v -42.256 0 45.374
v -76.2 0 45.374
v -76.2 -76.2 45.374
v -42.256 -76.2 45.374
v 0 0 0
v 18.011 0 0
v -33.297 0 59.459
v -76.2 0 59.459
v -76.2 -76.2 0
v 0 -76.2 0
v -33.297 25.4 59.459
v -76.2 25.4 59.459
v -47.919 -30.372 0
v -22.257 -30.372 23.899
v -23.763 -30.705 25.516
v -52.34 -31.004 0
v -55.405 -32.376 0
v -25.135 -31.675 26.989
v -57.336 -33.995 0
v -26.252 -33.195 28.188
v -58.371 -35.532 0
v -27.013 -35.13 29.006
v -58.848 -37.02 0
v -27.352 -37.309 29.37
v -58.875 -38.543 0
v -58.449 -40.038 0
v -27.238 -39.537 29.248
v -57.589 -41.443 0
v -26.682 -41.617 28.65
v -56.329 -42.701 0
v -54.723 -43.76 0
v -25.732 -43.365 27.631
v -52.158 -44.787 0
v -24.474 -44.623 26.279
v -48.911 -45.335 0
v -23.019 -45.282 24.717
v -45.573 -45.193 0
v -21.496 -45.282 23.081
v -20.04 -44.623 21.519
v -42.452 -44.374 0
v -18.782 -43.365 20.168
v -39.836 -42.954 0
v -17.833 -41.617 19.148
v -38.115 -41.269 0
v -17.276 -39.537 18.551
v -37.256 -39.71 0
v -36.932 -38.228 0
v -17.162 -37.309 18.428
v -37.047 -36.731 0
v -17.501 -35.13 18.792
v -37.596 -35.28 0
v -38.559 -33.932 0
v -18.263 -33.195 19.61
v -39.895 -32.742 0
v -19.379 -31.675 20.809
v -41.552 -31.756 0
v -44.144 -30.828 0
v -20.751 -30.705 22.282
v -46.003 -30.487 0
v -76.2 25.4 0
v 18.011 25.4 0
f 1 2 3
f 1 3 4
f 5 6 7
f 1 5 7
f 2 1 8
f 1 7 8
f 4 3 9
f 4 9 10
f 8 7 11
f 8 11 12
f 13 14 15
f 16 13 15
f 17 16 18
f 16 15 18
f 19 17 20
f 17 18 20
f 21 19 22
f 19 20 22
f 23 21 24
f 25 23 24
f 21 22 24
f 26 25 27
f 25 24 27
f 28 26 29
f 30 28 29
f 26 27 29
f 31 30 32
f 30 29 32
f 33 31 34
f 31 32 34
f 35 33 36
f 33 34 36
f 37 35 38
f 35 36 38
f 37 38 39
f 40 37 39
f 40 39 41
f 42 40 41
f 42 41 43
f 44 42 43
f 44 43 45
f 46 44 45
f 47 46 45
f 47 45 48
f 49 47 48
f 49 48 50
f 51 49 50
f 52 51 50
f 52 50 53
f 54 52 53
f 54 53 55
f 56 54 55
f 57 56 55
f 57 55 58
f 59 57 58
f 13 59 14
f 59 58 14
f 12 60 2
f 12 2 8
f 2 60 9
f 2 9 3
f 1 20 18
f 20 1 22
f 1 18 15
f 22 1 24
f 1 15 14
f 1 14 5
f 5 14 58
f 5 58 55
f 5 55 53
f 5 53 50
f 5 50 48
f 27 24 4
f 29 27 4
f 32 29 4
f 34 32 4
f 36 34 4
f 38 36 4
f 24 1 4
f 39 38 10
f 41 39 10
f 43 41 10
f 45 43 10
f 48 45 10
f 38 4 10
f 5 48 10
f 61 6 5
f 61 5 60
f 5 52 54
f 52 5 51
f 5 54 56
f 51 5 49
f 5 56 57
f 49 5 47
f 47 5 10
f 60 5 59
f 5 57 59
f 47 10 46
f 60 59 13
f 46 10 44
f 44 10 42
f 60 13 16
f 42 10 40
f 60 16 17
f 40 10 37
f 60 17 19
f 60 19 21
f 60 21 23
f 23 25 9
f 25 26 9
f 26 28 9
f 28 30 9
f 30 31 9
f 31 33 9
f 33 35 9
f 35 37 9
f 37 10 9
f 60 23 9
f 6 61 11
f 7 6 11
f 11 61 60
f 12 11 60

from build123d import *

# Parameters (mm, degrees)
F0_W     = 76.2000009418
F0_H     = 45.3736372292
F1_DEPTH = 76.2
F3_DEPTH = 76.201
F4_R     = 7.496665322
F5_DEPTH = 55.7640015627
F6_W     = 94.2109096795
F6_H     = 59.4590939581
F7_DEPTH = 25.4
F9_DEPTH = 101.601


with BuildPart() as f1:
    # F0 (on Front) → F1 (new body)
    with BuildSketch(Plane.XZ):
        with Locations((-38.1000004709, 22.6868186146)):
            Rectangle(F0_W, F0_H)
    extrude(amount=F1_DEPTH)

    # F2 (on face) → F3 (cut, through all)
    with BuildSketch(Plane.XZ.offset(76.2)):
        Polygon((0, 45.3736372292), (-42.2563627362, 45.3736372292), (0, 0), align=None)
    extrude(amount=-F3_DEPTH, mode=Mode.SUBTRACT)

    # F4 (on face) → F5 (cut, through all)
    with BuildSketch(Plane(origin=(0, 0, 0), x_dir=(0, 1, 0), z_dir=(0.7317979117, 0, 0.6815216918))):
        with Locations((-37.869092077, 32.6580442488)):
            Circle(F4_R)
    extrude(amount=-F5_DEPTH, mode=Mode.SUBTRACT)

    # F6 (on face) → F7 (join)
    with BuildSketch(Plane(origin=(0, 0, 0), x_dir=(-1, 0, 0), z_dir=(0, 1, 0))):
        with Locations((29.094546102, 29.7295469791)):
            Rectangle(F6_W, F6_H)
    extrude(amount=F7_DEPTH)

    # F8 (on face) → F9 (cut, through all)
    with BuildSketch(Plane(origin=(0, 25.4, 0), x_dir=(-1, 0, 0), z_dir=(0, 1, 0))):
        Polygon((-18.0109087378, 59.4590939581), (-18.0109087378, 0), (33.2966521382, 59.4590939581), align=None)
    extrude(amount=-F9_DEPTH, mode=Mode.SUBTRACT)


solid = f1.part
